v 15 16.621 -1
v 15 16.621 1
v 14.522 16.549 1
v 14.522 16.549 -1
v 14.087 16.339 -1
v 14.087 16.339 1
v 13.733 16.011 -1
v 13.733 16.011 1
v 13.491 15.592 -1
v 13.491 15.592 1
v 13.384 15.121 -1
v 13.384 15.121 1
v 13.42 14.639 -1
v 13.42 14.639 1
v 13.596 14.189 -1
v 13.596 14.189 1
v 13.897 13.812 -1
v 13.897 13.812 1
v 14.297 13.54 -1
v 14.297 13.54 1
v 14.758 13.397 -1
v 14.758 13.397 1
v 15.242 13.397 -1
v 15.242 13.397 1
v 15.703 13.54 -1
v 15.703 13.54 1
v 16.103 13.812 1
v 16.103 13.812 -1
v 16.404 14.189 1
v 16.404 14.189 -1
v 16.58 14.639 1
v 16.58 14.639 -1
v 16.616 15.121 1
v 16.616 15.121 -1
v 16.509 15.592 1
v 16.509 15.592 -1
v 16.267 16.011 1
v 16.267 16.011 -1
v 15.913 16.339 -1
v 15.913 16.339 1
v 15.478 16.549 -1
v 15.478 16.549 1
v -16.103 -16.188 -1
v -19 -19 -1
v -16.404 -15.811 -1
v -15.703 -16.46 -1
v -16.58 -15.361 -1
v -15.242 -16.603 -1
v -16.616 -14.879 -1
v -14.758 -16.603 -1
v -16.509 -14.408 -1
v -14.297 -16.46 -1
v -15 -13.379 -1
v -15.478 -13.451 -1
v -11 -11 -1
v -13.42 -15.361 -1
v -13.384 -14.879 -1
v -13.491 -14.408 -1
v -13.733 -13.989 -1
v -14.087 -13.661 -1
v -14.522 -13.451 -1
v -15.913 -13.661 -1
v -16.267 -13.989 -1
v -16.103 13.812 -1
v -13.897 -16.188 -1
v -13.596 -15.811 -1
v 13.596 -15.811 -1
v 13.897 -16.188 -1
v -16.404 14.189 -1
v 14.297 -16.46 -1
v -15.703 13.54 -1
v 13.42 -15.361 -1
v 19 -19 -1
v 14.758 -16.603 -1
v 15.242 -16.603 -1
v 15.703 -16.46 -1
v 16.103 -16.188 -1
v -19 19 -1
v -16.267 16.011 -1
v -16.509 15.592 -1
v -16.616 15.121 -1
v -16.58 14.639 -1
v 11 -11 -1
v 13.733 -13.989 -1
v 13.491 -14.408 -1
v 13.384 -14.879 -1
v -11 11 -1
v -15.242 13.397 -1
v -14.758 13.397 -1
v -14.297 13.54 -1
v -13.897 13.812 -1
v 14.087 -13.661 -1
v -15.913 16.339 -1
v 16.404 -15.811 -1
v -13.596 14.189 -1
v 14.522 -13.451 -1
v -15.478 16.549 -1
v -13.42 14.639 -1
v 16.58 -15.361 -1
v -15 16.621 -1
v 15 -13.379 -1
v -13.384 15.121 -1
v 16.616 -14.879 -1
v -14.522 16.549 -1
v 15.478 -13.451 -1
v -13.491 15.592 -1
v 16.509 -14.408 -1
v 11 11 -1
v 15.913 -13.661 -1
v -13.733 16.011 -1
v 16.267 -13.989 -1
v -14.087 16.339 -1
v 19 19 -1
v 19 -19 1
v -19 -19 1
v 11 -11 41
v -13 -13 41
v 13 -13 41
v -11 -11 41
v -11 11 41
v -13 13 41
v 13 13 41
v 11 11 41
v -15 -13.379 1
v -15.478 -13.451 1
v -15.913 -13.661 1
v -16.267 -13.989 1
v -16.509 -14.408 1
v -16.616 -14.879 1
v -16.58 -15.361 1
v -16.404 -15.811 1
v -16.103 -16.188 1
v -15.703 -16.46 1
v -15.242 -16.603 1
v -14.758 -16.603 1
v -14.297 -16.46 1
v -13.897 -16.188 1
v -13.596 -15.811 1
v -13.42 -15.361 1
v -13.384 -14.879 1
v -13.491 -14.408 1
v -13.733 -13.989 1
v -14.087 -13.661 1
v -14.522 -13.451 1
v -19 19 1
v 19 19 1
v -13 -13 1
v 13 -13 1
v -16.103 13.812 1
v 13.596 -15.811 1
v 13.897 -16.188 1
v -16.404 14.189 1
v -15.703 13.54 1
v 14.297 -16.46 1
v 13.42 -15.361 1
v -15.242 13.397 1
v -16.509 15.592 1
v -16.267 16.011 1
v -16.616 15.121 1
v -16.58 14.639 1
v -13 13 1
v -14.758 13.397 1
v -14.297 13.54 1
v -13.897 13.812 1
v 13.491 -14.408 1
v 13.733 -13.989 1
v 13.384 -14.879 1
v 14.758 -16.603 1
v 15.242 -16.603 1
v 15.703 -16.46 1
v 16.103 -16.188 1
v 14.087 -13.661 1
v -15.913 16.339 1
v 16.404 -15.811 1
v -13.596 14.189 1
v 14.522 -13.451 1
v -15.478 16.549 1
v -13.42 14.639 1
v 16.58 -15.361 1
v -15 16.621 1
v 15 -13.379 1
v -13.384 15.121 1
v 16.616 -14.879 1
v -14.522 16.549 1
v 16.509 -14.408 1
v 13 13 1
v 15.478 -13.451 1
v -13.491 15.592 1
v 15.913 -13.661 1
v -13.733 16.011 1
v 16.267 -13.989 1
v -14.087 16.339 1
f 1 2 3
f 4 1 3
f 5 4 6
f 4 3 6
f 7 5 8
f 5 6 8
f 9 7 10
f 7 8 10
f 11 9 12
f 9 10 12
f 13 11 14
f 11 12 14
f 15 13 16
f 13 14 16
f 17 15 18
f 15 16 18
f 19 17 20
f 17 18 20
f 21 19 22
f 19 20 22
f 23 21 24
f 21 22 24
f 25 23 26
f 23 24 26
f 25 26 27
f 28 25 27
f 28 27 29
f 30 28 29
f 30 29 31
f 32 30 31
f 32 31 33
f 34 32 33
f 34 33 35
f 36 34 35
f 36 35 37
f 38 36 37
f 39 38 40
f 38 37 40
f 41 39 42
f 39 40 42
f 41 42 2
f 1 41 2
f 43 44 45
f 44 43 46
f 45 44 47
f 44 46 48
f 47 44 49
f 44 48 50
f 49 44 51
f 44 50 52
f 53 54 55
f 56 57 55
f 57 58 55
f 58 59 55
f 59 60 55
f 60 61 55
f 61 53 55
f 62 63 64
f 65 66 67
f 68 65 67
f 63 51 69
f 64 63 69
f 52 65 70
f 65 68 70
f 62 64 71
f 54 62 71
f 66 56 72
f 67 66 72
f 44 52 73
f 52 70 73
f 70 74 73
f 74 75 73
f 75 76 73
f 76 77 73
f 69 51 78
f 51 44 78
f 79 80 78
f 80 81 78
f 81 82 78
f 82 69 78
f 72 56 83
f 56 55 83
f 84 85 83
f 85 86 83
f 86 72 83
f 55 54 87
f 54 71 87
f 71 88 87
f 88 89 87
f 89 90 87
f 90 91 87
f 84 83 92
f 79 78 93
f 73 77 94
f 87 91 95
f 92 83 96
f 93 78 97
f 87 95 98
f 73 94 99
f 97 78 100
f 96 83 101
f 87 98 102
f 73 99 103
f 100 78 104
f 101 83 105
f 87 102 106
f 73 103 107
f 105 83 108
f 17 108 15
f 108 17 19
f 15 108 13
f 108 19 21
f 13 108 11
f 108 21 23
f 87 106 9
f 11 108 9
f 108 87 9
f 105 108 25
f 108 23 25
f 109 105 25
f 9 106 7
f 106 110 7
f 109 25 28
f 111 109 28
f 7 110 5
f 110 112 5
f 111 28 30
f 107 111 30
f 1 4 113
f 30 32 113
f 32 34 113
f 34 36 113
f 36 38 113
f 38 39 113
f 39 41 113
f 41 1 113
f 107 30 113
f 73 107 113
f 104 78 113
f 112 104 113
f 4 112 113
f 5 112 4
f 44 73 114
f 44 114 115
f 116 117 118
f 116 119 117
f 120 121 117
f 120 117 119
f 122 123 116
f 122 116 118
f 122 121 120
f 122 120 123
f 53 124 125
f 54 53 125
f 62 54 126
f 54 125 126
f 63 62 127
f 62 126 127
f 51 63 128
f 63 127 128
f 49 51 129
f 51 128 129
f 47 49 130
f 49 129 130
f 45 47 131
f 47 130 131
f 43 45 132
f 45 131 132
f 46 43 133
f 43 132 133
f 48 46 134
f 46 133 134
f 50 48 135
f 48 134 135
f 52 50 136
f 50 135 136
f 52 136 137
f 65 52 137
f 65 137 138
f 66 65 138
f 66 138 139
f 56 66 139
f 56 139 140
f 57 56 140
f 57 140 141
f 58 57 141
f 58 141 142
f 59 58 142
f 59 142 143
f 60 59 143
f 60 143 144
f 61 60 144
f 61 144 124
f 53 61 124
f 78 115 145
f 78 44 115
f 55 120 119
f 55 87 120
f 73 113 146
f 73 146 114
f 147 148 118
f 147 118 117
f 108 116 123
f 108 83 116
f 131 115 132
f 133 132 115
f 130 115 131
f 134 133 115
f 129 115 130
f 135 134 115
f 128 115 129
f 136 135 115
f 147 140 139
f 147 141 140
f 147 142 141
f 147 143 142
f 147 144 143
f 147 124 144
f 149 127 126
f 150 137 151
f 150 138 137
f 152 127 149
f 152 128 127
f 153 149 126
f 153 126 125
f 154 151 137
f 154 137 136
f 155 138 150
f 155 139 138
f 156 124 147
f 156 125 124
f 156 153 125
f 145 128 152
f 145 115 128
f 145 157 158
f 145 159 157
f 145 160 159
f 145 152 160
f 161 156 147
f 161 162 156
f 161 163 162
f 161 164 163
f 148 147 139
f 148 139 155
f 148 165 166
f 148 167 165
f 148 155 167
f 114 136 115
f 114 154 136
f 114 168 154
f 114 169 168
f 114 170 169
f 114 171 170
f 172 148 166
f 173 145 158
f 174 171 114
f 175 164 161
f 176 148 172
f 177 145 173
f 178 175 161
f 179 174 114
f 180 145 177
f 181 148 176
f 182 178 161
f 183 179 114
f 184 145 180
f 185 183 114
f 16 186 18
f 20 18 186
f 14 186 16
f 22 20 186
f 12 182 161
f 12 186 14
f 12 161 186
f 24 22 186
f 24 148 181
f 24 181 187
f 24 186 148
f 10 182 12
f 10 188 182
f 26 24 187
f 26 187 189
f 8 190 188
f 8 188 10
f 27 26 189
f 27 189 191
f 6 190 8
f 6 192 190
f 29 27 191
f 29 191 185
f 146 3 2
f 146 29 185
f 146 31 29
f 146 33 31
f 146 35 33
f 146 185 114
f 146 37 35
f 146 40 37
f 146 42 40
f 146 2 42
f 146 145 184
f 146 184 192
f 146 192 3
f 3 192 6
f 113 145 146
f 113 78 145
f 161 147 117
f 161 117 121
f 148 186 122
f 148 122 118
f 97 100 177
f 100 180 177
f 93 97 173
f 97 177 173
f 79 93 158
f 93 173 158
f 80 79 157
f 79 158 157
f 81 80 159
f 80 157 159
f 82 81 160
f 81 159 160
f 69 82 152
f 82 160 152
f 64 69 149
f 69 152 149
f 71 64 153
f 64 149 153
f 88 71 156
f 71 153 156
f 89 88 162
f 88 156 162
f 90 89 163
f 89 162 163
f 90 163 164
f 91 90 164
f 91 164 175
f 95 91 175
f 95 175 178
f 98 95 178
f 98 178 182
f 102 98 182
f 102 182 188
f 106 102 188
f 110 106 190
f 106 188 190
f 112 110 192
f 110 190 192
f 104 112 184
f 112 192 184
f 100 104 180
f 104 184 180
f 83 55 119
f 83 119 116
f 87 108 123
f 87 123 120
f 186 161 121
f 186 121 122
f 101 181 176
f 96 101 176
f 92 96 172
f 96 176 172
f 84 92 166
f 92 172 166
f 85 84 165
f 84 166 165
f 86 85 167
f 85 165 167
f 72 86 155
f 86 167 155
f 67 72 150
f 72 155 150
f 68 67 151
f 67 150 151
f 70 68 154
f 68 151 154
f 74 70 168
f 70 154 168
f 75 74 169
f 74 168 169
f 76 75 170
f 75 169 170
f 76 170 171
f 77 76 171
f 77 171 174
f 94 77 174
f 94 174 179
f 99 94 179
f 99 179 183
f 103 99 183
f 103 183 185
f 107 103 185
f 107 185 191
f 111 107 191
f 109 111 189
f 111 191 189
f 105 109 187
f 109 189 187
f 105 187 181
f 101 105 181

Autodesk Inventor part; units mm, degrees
ref_plane "YZ Plane" through (0, 0, 0) normal (1, 0, 0) x (0, 1, 0)
ref_plane "XZ Plane" through (0, 0, 0) normal (0, 1, 0) x (-1, 0, 0)
ref_plane "XY Plane" through (0, 0, 0) normal (0, 0, 1) x (1, 0, 0)
sketch "Sketch1" plane through (0, 0, 0) normal (0, 0, 1) x (1, 0, 0)
  line L0 (-19, 19) -> (19, 19)
  line L1 (19, 19) -> (19, -19)
  line L2 (19, -19) -> (-19, -19)
  line L3 (-19, -19) -> (-19, 19)
  line L4 (-19, 19) -> (19, -19) construction
  line L5 (19, 19) -> (-19, -19) construction
  line L6 (-11, 11) -> (11, 11)
  line L7 (11, 11) -> (11, -11)
  line L8 (11, -11) -> (-11, -11)
  line L9 (-11, -11) -> (-11, 11)
  line L10 (-11, 11) -> (11, -11) construction
  line L11 (11, 11) -> (-11, -11) construction
  point P0 (0, 0)
  dimension "d0" = 38
  dimension "d1" = 38
  dimension "d2" = 22
  dimension "d3" = 22
extrude "Extrusion1" add sketch "Sketch1" along normal mid plane 2
sketch "Sketch2" plane through (0, 0, 1) normal (0, 0, 1) x (1, 0, 0)
  line L0 (-13, 13) -> (13, 13)
  line L1 (13, 13) -> (13, -13)
  line L2 (13, -13) -> (-13, -13)
  line L3 (-13, -13) -> (-13, 13)
  line L4 (-13, 13) -> (13, -13) construction
  line L5 (13, 13) -> (-13, -13) construction
  line L6 (-11, -11) -> (11, -11)
  line L7 (11, -11) -> (11, 11)
  line L8 (11, 11) -> (-11, 11)
  line L9 (-11, 11) -> (-11, -11)
  line L10 (-11, -11) -> (11, 11) construction
  line L11 (11, -11) -> (-11, 11) construction
  point P0 (0, 0)
  dimension "d6" = 26
  dimension "d7" = 26
  dimension "d8" = 22
extrude "Extrusion2" add sketch "Sketch2" along normal blind 40
sketch "Sketch3" plane through (0, 0, -1) normal (0, 0, -1) x (-1, 0, 0)
  line L0 (11, -11) -> (11, 11) projected
  line L1 (11, 11) -> (-11, 11) projected
  line L2 (-11, 11) -> (-11, -11) projected
  line L3 (-11, -11) -> (11, -11) projected
  line L4 (19, 19) -> (19, -19) projected
  line L5 (19, -19) -> (-19, -19) projected
  line L6 (-19, -19) -> (-19, 19) projected
  line L7 (-19, 19) -> (19, 19) projected
  point P0 (0, 0)
  point P1 (15, -15)
  point P2 (-15, -15)
  point P3 (15, 15)
  point P4 (-15, 15)
  dimension "d11" = 15
  dimension "d12" = 15
  dimension "d15" = 30
  dimension "d18" = 30
hole "Hole1" at (-15, -15, -1) at (15, -15, -1) at (-15, 15, -1) at (15, 15, -1) direction (0, 0, 1) diameter 3.242 end through all thread size "M4x0.7" class "6H" standard "ANSI Metric M Profile"
equation "\"d1\" = d0"
equation "\"d3\" = d2"
equation "\"d7\" = d6"
properties part number "pmtholder"
